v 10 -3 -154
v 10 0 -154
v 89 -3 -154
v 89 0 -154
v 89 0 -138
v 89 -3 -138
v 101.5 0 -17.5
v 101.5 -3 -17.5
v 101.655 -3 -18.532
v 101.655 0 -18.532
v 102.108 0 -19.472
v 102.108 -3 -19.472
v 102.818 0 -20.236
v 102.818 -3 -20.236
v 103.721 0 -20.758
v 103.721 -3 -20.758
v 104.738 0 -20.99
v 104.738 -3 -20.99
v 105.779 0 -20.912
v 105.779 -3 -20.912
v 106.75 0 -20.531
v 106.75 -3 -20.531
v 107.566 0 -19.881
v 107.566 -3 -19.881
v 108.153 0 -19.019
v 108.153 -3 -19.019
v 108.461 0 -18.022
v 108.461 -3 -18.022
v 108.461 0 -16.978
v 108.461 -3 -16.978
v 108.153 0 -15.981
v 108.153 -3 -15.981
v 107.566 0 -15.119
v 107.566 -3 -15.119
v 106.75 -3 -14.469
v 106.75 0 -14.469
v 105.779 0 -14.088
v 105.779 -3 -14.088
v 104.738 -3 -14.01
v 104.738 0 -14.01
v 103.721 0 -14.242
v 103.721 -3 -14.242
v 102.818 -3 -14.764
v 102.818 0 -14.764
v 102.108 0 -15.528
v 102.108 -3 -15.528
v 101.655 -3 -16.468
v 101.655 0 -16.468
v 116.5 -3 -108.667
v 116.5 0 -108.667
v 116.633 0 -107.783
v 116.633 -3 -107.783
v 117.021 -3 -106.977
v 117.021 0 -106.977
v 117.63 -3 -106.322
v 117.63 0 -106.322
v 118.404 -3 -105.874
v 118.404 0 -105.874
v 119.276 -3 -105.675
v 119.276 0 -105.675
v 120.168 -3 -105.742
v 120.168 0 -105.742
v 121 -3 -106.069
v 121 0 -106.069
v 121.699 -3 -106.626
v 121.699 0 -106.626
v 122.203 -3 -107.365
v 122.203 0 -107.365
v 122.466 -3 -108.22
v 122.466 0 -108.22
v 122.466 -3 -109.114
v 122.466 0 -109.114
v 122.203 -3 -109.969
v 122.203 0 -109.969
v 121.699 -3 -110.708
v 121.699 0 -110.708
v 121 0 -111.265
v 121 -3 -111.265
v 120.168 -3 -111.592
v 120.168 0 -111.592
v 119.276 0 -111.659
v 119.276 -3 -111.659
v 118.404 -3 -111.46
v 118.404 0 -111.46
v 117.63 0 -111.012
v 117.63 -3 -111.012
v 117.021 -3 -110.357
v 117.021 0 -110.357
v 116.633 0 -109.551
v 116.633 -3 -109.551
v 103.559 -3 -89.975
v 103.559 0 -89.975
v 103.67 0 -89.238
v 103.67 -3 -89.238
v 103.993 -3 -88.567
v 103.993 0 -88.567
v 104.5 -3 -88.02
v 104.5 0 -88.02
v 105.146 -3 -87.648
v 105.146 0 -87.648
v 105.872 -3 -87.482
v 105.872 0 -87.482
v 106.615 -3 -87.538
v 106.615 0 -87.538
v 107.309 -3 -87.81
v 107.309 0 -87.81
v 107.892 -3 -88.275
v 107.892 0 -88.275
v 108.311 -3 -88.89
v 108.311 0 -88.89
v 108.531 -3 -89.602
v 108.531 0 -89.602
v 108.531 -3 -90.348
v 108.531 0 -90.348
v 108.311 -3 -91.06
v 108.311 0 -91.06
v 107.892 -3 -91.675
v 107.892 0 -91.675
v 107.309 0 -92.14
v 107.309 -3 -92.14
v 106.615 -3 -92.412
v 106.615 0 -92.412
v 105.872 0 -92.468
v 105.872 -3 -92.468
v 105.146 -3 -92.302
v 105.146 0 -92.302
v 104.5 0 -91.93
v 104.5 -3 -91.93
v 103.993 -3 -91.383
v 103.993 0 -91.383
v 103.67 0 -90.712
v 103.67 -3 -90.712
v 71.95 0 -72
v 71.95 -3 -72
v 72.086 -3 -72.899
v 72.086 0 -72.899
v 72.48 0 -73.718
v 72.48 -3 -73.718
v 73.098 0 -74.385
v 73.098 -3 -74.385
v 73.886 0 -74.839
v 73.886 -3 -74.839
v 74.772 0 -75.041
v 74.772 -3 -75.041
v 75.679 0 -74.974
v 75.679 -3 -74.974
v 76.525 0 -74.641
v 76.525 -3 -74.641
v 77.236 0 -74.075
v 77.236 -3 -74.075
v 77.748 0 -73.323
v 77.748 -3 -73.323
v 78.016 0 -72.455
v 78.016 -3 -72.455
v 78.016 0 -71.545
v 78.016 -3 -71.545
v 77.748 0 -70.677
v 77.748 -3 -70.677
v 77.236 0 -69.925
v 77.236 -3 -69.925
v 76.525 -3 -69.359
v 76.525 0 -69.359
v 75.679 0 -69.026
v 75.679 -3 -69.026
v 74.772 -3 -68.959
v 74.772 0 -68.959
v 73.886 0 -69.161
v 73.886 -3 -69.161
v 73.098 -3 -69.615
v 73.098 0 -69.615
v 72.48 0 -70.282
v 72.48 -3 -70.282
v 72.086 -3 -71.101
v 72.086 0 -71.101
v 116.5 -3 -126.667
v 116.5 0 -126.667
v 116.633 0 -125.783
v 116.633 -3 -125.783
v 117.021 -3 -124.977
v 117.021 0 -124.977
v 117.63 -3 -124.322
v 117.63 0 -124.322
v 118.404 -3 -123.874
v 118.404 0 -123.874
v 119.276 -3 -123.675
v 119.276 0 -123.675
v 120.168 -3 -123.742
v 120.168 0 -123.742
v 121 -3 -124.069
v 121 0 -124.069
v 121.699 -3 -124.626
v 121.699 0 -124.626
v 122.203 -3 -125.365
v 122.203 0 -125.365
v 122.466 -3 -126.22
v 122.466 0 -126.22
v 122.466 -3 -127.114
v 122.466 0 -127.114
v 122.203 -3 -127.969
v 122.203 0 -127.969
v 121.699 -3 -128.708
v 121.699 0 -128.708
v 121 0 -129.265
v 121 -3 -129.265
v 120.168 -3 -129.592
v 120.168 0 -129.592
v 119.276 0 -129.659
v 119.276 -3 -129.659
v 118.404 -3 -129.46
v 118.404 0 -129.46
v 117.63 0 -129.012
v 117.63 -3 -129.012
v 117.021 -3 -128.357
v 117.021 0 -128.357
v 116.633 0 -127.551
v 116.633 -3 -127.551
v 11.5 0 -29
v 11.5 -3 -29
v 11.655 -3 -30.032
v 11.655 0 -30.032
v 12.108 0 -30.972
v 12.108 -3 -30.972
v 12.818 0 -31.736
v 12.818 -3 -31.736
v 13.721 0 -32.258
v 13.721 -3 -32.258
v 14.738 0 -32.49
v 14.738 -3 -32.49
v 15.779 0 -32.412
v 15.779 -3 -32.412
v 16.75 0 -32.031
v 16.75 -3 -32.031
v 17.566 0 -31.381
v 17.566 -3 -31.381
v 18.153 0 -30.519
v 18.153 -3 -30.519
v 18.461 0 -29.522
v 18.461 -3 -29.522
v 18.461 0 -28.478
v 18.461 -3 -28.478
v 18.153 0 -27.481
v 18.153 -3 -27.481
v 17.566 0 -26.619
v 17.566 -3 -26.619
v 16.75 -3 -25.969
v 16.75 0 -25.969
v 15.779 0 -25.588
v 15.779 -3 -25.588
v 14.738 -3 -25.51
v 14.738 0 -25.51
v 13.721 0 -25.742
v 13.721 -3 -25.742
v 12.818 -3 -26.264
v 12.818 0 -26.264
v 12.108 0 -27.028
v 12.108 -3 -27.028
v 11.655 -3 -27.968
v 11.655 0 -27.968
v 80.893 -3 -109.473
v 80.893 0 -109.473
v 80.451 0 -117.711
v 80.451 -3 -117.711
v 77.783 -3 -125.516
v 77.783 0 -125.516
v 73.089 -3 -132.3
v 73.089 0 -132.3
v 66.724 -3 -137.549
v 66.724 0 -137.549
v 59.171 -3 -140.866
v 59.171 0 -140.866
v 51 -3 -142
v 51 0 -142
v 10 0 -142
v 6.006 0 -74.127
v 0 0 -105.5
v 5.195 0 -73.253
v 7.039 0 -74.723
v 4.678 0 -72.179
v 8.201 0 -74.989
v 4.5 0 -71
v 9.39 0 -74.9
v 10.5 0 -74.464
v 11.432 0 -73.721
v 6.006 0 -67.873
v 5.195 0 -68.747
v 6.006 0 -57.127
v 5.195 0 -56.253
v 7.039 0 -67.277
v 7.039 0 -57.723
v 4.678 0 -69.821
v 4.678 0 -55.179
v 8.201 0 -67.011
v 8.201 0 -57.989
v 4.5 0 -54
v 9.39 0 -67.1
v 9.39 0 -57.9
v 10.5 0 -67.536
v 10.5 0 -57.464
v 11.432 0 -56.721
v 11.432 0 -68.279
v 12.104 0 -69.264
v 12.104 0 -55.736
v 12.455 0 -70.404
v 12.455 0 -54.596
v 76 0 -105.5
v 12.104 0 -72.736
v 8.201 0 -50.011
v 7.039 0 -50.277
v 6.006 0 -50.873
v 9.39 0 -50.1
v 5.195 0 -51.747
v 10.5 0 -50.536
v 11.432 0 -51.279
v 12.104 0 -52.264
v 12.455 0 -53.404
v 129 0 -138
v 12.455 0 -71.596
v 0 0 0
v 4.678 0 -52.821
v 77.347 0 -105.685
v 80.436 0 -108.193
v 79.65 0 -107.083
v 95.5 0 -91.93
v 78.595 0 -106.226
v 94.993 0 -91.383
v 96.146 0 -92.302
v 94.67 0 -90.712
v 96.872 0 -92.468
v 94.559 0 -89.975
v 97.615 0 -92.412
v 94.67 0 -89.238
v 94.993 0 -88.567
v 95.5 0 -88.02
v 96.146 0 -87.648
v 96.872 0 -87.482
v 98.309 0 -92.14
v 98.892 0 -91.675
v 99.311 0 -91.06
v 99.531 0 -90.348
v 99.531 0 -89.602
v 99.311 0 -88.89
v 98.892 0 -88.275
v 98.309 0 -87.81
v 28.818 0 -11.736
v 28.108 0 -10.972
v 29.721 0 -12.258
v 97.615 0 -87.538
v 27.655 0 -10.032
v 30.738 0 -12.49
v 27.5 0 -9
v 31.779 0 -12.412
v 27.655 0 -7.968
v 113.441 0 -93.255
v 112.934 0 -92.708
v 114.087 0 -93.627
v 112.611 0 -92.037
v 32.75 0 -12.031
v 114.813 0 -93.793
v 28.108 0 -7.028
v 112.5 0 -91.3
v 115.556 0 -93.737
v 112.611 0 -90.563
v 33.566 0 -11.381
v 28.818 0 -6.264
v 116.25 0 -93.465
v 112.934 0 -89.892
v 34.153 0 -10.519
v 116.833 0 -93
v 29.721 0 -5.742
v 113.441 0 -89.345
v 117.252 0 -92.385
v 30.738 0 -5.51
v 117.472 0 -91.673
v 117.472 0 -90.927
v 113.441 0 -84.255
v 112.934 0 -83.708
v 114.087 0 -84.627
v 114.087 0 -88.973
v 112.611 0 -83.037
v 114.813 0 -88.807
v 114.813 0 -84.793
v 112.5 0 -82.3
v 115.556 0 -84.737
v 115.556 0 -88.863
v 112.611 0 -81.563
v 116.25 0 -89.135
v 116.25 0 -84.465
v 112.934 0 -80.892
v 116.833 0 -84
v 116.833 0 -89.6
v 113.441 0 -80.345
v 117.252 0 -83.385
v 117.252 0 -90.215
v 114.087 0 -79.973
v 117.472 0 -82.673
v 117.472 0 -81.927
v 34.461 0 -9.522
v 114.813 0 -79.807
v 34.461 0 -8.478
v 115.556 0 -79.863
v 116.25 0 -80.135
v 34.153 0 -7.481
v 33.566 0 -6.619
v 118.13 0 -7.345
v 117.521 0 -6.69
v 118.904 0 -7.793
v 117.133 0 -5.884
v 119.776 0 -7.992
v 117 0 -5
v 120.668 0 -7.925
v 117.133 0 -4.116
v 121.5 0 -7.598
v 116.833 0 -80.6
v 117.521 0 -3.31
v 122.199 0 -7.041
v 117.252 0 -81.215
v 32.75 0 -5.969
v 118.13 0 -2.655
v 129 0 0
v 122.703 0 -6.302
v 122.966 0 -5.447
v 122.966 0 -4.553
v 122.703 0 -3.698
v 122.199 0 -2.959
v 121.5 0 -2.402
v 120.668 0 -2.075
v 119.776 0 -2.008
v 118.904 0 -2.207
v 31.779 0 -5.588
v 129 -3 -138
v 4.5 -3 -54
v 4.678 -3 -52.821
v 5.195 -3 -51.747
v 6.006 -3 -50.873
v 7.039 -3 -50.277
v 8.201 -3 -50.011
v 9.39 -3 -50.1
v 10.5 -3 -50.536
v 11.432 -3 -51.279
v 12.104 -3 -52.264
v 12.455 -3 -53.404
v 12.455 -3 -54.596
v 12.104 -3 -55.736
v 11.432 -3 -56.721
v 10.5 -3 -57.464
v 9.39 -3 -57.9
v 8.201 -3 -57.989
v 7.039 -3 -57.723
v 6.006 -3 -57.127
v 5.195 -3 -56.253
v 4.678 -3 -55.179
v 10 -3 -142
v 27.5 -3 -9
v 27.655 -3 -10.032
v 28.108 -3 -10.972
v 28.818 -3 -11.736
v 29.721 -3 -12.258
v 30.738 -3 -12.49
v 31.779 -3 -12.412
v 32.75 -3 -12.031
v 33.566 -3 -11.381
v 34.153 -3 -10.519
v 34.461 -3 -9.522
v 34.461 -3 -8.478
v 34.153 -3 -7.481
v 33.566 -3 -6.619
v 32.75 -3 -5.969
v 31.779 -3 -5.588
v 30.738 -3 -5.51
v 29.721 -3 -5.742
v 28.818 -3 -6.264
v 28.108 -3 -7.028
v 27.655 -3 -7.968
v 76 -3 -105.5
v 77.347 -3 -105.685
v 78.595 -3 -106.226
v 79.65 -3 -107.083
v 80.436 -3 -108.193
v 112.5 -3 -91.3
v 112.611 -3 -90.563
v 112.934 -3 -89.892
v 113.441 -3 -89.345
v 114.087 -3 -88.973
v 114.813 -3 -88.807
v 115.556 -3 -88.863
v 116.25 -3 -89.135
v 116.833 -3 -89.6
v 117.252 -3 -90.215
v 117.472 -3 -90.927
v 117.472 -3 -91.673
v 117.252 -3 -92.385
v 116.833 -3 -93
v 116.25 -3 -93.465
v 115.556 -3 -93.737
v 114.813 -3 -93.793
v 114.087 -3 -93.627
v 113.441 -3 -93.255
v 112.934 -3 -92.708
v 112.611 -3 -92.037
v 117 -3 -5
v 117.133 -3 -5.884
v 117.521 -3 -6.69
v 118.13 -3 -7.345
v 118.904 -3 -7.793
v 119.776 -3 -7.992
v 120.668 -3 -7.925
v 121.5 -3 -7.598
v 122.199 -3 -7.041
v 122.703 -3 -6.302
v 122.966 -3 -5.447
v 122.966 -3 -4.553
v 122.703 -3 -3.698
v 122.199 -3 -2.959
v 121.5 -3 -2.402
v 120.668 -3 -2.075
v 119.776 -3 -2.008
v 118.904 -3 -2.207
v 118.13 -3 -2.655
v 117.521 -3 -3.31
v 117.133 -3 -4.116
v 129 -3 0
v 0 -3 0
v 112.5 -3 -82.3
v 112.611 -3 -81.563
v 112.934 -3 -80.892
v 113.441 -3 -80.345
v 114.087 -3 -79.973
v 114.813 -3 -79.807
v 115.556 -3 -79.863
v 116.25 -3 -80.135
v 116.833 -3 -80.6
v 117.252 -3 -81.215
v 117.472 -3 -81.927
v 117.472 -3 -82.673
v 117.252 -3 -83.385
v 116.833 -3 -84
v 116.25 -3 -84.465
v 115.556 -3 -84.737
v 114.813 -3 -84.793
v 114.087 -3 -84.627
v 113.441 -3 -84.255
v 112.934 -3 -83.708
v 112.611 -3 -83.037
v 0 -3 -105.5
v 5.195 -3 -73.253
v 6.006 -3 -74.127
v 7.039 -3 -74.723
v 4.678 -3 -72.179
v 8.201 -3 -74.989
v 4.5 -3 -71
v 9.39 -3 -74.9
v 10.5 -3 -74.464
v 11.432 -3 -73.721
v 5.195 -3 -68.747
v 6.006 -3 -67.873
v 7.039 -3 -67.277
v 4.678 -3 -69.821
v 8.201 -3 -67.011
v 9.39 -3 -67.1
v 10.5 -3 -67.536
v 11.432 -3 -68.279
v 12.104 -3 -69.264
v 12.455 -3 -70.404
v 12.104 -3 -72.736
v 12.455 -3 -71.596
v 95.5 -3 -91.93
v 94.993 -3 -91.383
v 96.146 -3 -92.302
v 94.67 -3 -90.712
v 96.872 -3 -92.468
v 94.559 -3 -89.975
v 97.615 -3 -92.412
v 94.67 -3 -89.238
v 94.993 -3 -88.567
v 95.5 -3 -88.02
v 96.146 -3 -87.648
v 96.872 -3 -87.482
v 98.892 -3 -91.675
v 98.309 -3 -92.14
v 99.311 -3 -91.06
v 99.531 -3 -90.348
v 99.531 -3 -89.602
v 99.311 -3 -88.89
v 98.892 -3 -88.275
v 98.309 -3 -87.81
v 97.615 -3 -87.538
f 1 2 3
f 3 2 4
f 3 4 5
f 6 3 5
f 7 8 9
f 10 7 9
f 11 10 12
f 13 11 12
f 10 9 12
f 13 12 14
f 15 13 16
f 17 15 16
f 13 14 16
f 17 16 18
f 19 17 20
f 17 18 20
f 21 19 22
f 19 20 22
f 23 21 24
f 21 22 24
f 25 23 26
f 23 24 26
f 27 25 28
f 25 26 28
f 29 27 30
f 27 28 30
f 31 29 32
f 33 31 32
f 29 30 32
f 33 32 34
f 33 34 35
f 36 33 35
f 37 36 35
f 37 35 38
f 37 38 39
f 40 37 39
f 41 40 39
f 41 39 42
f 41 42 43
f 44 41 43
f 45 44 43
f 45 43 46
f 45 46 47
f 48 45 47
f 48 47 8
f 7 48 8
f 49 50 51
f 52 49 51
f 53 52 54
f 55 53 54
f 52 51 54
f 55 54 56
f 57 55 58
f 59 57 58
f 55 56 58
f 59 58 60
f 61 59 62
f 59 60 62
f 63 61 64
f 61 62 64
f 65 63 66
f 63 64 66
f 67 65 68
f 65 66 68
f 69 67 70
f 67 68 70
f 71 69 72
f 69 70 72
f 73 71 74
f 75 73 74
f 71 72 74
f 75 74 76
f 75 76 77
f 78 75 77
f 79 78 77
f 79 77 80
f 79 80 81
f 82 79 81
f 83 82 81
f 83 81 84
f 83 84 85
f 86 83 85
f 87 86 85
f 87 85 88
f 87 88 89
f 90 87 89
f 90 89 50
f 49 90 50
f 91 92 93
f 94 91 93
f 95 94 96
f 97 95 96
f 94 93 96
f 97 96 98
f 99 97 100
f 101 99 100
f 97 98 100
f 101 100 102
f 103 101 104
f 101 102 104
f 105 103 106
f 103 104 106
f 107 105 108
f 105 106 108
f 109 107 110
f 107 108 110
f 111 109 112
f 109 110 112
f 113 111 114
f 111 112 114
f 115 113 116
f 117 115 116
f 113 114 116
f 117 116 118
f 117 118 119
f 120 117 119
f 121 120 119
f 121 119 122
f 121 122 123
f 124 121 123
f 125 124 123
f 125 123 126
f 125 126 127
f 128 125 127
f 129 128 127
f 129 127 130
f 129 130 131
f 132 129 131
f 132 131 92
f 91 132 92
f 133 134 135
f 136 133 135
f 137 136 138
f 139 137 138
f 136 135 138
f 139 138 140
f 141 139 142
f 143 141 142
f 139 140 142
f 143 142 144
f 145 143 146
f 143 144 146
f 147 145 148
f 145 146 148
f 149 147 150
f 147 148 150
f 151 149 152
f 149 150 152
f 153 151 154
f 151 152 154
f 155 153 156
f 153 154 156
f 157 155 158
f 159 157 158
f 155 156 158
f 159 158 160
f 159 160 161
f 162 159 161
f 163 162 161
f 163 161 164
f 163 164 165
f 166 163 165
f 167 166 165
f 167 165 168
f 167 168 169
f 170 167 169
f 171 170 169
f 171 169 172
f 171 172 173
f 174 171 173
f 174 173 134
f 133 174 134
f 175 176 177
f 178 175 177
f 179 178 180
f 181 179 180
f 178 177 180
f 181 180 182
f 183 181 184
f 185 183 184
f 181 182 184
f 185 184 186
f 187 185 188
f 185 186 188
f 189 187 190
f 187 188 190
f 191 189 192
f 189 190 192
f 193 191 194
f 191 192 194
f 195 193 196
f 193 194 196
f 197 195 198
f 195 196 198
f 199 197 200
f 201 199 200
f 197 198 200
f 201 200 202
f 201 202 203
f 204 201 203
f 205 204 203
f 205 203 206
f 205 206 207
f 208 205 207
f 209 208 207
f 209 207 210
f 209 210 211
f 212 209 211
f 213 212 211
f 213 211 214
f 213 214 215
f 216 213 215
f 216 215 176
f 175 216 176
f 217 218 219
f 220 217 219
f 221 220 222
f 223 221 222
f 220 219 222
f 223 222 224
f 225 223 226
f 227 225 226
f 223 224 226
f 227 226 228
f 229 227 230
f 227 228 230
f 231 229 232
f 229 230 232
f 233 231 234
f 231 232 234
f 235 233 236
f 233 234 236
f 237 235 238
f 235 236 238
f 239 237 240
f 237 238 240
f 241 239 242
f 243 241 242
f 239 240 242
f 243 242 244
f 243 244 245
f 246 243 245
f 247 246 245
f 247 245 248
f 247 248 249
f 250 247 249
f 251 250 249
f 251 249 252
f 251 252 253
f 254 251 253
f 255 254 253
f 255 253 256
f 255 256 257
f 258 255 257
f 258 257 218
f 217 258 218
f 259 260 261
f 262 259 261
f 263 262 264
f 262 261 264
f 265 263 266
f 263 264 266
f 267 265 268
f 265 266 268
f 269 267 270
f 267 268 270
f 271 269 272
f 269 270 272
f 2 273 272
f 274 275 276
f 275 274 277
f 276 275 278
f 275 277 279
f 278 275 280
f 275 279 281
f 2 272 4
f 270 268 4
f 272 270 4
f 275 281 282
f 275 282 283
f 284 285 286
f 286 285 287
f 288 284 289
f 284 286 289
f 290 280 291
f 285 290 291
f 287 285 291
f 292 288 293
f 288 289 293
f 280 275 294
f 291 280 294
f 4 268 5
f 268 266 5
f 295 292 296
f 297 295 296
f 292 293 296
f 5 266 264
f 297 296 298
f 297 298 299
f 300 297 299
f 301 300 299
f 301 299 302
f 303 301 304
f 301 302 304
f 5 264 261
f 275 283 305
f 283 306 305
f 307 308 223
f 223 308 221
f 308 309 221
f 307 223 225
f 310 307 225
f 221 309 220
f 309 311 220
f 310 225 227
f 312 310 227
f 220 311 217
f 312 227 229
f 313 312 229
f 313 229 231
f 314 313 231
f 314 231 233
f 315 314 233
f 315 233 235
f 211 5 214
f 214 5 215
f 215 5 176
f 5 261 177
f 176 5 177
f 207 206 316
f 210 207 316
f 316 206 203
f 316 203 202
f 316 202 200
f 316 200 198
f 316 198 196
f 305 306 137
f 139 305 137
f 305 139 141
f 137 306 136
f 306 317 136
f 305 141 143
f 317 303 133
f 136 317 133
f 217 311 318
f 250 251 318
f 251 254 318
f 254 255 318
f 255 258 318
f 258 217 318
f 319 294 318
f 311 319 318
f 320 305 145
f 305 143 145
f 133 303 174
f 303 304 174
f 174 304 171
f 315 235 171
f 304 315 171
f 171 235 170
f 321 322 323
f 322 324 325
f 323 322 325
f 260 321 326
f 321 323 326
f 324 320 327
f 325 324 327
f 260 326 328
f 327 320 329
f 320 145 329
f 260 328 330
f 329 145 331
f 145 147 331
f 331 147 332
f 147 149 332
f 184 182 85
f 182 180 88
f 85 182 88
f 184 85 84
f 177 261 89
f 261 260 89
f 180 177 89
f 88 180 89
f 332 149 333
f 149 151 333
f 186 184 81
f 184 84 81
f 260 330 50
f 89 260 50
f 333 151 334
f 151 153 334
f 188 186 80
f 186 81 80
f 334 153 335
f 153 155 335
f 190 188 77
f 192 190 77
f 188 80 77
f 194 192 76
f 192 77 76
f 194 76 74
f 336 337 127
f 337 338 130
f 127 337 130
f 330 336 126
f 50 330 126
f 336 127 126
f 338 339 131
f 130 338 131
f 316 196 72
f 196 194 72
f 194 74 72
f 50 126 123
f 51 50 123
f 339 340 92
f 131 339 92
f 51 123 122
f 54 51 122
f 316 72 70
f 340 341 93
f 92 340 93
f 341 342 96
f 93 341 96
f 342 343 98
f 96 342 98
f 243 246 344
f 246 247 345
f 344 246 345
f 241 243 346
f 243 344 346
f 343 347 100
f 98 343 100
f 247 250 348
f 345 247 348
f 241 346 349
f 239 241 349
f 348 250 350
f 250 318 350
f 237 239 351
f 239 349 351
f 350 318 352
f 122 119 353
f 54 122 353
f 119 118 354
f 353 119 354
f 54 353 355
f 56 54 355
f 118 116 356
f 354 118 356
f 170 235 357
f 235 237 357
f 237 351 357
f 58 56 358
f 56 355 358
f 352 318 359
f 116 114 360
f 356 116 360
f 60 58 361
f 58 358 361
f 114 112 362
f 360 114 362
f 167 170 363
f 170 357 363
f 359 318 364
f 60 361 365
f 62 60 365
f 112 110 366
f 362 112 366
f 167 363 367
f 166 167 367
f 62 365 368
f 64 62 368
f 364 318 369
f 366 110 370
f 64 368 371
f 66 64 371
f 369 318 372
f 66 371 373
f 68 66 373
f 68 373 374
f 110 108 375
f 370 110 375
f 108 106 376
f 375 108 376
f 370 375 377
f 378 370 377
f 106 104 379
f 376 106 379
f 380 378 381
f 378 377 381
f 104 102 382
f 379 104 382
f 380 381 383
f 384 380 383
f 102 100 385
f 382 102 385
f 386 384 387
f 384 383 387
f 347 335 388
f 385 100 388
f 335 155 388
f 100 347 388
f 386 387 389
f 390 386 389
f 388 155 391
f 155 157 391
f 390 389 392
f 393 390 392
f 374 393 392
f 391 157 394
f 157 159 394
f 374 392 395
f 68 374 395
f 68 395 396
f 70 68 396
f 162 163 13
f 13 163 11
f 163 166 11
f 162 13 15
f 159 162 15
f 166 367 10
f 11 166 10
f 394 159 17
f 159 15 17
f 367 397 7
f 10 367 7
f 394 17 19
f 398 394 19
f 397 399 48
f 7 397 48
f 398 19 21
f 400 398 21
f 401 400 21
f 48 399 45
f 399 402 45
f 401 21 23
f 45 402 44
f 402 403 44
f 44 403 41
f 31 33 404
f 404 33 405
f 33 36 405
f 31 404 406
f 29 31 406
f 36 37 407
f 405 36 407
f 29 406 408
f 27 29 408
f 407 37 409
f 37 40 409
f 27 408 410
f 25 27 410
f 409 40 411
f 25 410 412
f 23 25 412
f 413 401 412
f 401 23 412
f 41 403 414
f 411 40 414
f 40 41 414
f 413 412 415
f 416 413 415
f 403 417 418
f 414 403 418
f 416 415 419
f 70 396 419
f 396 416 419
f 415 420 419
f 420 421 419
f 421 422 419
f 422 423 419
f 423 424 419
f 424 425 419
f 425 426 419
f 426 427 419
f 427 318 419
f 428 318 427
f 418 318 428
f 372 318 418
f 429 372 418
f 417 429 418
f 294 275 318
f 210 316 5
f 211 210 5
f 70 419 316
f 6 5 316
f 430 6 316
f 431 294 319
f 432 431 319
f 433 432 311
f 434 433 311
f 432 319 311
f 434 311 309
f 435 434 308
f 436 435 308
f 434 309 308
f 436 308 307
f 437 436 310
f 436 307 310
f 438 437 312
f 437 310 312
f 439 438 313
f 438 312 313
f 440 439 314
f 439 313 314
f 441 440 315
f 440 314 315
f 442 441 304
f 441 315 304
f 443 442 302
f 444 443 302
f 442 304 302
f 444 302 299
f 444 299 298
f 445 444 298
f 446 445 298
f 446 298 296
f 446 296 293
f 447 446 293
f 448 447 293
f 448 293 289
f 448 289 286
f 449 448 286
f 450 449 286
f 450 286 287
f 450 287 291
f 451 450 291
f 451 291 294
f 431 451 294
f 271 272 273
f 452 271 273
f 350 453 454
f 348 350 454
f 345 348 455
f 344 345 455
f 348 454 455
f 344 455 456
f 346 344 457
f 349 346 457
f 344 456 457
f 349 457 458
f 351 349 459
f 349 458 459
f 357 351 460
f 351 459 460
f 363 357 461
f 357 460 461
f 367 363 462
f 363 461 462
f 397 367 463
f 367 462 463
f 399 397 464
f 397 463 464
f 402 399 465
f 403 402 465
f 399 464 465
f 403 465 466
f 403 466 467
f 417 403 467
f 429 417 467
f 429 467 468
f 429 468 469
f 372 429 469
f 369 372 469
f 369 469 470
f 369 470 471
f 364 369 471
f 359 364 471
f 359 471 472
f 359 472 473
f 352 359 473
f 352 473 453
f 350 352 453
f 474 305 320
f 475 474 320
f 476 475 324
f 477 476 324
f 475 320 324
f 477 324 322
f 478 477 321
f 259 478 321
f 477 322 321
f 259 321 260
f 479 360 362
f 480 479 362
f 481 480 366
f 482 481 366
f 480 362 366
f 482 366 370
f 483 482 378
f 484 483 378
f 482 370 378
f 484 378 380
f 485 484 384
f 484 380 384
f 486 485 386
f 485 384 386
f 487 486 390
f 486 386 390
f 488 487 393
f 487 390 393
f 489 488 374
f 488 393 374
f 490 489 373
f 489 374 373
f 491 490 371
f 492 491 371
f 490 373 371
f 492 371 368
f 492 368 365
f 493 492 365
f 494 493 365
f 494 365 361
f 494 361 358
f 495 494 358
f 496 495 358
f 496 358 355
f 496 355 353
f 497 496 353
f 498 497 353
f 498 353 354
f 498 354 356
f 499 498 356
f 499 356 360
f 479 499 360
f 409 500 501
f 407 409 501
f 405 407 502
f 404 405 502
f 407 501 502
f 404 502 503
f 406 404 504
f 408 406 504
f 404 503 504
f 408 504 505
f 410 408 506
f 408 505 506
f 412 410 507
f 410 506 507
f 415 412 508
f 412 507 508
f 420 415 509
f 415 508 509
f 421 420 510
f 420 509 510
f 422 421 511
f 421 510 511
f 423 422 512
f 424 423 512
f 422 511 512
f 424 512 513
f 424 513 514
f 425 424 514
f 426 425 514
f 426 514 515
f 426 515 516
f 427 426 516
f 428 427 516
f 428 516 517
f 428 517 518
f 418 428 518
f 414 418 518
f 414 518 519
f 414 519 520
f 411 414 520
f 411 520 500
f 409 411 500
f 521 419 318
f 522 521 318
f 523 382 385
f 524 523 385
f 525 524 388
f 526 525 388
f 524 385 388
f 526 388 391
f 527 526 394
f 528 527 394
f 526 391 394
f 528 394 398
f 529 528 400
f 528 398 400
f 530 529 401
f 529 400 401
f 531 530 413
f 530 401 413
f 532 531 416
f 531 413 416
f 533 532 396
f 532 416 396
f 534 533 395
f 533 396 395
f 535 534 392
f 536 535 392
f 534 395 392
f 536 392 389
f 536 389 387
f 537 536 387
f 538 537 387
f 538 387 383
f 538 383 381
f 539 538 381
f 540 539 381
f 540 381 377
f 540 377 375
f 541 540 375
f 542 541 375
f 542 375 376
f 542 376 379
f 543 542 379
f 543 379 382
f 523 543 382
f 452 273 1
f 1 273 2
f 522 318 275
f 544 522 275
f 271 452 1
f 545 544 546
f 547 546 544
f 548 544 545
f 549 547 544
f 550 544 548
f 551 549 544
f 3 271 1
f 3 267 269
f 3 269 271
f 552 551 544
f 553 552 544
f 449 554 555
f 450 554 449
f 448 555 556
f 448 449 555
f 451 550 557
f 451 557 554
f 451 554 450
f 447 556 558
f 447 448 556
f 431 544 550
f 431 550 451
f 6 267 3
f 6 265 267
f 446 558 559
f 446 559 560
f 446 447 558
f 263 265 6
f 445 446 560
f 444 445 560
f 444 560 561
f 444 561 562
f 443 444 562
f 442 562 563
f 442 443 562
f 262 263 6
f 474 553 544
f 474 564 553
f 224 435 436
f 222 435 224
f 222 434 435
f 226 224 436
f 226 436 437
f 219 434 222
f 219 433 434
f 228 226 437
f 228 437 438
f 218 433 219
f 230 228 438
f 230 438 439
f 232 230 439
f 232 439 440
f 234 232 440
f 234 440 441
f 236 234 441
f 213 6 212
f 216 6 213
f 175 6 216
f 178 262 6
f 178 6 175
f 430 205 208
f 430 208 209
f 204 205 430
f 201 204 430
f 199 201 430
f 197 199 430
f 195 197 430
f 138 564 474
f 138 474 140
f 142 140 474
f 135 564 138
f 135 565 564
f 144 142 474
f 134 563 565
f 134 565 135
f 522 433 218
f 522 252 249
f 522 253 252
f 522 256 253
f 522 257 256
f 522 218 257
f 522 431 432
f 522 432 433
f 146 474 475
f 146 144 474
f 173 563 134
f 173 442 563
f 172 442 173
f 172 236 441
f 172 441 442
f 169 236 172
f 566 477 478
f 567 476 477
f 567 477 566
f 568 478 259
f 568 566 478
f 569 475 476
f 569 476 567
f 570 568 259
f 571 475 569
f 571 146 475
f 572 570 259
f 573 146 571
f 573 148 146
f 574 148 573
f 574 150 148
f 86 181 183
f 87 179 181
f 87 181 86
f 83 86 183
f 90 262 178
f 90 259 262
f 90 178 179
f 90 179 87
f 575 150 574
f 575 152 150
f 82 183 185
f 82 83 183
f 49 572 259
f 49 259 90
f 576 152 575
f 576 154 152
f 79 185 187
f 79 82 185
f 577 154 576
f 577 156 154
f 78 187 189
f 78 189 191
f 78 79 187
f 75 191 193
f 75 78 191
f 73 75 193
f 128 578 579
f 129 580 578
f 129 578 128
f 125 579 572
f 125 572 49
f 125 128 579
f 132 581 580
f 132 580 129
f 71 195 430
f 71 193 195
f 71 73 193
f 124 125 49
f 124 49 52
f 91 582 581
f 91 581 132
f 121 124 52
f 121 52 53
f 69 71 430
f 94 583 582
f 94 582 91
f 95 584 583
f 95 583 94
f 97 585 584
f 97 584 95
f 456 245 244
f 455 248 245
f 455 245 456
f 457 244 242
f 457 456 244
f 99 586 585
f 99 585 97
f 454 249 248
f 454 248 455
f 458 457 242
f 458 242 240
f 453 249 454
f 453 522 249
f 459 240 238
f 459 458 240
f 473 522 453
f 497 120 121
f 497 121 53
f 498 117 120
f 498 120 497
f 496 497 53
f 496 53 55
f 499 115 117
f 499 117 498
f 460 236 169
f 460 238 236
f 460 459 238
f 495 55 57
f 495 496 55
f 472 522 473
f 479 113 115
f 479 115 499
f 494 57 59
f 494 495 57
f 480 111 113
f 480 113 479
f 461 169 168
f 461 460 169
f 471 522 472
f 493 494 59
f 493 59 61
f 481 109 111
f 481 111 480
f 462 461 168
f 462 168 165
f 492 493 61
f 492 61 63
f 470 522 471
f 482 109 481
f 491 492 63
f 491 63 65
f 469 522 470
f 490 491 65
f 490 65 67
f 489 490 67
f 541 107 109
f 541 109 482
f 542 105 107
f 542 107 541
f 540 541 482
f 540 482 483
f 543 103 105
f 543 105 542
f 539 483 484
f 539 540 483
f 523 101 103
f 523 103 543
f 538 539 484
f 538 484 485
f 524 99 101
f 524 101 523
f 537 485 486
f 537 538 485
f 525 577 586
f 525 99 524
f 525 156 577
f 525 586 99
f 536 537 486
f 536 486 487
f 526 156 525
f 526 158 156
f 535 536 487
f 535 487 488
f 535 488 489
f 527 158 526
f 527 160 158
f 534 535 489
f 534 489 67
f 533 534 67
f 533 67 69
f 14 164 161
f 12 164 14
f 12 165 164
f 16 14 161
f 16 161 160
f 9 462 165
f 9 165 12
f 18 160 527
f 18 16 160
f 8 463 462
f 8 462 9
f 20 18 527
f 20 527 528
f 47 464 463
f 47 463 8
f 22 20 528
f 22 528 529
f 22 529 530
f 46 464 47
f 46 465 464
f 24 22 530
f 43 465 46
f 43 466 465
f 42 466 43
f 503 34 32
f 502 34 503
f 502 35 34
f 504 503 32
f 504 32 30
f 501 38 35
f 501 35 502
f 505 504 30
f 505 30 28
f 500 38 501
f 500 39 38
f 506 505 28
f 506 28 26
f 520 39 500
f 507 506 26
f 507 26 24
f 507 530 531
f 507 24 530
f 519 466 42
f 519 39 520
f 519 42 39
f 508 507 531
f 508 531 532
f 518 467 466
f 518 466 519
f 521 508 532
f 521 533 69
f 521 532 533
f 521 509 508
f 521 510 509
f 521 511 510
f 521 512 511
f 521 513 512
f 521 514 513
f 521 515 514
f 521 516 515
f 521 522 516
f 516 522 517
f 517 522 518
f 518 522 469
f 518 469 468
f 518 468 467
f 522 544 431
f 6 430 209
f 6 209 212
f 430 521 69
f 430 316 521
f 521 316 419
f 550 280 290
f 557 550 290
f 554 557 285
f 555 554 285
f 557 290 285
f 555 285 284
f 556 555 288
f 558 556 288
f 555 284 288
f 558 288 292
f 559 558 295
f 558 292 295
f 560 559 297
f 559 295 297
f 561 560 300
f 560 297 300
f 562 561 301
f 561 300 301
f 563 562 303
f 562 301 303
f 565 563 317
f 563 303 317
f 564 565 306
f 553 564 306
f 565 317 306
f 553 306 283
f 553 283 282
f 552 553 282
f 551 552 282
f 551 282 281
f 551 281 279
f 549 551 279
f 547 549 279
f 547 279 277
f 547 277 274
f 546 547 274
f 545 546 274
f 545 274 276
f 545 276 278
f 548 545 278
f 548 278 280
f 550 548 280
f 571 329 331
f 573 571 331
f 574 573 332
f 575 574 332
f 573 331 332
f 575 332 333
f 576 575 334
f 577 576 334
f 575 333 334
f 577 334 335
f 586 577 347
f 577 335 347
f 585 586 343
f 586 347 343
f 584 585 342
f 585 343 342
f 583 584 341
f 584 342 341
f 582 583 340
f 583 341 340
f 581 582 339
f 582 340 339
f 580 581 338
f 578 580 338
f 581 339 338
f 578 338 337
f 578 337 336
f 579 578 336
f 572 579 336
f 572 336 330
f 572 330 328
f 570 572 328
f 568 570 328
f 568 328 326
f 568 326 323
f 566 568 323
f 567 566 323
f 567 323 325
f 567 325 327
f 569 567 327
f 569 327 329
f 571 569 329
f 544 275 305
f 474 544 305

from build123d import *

# Parameters (mm, degrees)
F1_DEPTH = 3
F2_D     = 6
F3_D     = 7
F4_D     = 6.1
F6_D     = 5
F7_D     = 8
F8_D     = 6


with BuildPart() as f1:
    # F0 (on Front) → F1 (new body)
    with BuildSketch(Plane.XZ):
        with BuildLine():
            Line((129, 0), (0, 0))
            Line((0, 0), (0, -105.5))
            Line((0, -105.5), (76, -105.5))
            ThreePointArc((76, -105.5), (79.1515590041, -106.6182895724), (80.8933757798, -109.4729296625))
            ThreePointArc((80.8933757798, -109.4729296625), (73.0885955883, -132.3000971657), (51, -142))
            Line((51, -142), (10, -142))
            Line((10, -142), (10, -154))
            Line((10, -154), (89, -154))
            Line((89, -154), (89, -138))
            Line((89, -138), (129, -138))
            Line((129, -138), (129, 0))
        make_face()
    extrude(amount=F1_DEPTH)

    # F2 (through all)
    with Locations(Plane(origin=(0, 0, 0), x_dir=(1, 0, 0), z_dir=(0, 1, 0))):
        with Locations((120, 5)):
            Hole(F2_D / 2)

    # F3 (through all)
    with Locations(Plane(origin=(0, 0, 0), x_dir=(1, 0, 0), z_dir=(0, 1, 0))):
        with Locations((15, 29), (31, 9), (105, 17.5)):
            Hole(F3_D / 2)

    # F4 (through all)
    with Locations(Plane(origin=(0, 0, 0), x_dir=(1, 0, 0), z_dir=(0, 1, 0))):
        with Locations((75, 72)):
            Hole(F4_D / 2)

    # F6 (through all)
    with Locations(Plane.XZ.offset(3)):
        with Locations((106.059, -89.975), (115, -91.3), (115, -82.3), (97.059, -89.975)):
            Hole(F6_D / 2)

    # F7 (through all)
    with Locations(Plane.XZ.offset(3)):
        with Locations((8.5, -71), (8.5, -54)):
            Hole(F7_D / 2)

    # F8 (through all)
    with Locations(Plane.XZ.offset(3)):
        with Locations((119.5, -108.667), (119.5, -126.667)):
            Hole(F8_D / 2)


solid = f1.part
